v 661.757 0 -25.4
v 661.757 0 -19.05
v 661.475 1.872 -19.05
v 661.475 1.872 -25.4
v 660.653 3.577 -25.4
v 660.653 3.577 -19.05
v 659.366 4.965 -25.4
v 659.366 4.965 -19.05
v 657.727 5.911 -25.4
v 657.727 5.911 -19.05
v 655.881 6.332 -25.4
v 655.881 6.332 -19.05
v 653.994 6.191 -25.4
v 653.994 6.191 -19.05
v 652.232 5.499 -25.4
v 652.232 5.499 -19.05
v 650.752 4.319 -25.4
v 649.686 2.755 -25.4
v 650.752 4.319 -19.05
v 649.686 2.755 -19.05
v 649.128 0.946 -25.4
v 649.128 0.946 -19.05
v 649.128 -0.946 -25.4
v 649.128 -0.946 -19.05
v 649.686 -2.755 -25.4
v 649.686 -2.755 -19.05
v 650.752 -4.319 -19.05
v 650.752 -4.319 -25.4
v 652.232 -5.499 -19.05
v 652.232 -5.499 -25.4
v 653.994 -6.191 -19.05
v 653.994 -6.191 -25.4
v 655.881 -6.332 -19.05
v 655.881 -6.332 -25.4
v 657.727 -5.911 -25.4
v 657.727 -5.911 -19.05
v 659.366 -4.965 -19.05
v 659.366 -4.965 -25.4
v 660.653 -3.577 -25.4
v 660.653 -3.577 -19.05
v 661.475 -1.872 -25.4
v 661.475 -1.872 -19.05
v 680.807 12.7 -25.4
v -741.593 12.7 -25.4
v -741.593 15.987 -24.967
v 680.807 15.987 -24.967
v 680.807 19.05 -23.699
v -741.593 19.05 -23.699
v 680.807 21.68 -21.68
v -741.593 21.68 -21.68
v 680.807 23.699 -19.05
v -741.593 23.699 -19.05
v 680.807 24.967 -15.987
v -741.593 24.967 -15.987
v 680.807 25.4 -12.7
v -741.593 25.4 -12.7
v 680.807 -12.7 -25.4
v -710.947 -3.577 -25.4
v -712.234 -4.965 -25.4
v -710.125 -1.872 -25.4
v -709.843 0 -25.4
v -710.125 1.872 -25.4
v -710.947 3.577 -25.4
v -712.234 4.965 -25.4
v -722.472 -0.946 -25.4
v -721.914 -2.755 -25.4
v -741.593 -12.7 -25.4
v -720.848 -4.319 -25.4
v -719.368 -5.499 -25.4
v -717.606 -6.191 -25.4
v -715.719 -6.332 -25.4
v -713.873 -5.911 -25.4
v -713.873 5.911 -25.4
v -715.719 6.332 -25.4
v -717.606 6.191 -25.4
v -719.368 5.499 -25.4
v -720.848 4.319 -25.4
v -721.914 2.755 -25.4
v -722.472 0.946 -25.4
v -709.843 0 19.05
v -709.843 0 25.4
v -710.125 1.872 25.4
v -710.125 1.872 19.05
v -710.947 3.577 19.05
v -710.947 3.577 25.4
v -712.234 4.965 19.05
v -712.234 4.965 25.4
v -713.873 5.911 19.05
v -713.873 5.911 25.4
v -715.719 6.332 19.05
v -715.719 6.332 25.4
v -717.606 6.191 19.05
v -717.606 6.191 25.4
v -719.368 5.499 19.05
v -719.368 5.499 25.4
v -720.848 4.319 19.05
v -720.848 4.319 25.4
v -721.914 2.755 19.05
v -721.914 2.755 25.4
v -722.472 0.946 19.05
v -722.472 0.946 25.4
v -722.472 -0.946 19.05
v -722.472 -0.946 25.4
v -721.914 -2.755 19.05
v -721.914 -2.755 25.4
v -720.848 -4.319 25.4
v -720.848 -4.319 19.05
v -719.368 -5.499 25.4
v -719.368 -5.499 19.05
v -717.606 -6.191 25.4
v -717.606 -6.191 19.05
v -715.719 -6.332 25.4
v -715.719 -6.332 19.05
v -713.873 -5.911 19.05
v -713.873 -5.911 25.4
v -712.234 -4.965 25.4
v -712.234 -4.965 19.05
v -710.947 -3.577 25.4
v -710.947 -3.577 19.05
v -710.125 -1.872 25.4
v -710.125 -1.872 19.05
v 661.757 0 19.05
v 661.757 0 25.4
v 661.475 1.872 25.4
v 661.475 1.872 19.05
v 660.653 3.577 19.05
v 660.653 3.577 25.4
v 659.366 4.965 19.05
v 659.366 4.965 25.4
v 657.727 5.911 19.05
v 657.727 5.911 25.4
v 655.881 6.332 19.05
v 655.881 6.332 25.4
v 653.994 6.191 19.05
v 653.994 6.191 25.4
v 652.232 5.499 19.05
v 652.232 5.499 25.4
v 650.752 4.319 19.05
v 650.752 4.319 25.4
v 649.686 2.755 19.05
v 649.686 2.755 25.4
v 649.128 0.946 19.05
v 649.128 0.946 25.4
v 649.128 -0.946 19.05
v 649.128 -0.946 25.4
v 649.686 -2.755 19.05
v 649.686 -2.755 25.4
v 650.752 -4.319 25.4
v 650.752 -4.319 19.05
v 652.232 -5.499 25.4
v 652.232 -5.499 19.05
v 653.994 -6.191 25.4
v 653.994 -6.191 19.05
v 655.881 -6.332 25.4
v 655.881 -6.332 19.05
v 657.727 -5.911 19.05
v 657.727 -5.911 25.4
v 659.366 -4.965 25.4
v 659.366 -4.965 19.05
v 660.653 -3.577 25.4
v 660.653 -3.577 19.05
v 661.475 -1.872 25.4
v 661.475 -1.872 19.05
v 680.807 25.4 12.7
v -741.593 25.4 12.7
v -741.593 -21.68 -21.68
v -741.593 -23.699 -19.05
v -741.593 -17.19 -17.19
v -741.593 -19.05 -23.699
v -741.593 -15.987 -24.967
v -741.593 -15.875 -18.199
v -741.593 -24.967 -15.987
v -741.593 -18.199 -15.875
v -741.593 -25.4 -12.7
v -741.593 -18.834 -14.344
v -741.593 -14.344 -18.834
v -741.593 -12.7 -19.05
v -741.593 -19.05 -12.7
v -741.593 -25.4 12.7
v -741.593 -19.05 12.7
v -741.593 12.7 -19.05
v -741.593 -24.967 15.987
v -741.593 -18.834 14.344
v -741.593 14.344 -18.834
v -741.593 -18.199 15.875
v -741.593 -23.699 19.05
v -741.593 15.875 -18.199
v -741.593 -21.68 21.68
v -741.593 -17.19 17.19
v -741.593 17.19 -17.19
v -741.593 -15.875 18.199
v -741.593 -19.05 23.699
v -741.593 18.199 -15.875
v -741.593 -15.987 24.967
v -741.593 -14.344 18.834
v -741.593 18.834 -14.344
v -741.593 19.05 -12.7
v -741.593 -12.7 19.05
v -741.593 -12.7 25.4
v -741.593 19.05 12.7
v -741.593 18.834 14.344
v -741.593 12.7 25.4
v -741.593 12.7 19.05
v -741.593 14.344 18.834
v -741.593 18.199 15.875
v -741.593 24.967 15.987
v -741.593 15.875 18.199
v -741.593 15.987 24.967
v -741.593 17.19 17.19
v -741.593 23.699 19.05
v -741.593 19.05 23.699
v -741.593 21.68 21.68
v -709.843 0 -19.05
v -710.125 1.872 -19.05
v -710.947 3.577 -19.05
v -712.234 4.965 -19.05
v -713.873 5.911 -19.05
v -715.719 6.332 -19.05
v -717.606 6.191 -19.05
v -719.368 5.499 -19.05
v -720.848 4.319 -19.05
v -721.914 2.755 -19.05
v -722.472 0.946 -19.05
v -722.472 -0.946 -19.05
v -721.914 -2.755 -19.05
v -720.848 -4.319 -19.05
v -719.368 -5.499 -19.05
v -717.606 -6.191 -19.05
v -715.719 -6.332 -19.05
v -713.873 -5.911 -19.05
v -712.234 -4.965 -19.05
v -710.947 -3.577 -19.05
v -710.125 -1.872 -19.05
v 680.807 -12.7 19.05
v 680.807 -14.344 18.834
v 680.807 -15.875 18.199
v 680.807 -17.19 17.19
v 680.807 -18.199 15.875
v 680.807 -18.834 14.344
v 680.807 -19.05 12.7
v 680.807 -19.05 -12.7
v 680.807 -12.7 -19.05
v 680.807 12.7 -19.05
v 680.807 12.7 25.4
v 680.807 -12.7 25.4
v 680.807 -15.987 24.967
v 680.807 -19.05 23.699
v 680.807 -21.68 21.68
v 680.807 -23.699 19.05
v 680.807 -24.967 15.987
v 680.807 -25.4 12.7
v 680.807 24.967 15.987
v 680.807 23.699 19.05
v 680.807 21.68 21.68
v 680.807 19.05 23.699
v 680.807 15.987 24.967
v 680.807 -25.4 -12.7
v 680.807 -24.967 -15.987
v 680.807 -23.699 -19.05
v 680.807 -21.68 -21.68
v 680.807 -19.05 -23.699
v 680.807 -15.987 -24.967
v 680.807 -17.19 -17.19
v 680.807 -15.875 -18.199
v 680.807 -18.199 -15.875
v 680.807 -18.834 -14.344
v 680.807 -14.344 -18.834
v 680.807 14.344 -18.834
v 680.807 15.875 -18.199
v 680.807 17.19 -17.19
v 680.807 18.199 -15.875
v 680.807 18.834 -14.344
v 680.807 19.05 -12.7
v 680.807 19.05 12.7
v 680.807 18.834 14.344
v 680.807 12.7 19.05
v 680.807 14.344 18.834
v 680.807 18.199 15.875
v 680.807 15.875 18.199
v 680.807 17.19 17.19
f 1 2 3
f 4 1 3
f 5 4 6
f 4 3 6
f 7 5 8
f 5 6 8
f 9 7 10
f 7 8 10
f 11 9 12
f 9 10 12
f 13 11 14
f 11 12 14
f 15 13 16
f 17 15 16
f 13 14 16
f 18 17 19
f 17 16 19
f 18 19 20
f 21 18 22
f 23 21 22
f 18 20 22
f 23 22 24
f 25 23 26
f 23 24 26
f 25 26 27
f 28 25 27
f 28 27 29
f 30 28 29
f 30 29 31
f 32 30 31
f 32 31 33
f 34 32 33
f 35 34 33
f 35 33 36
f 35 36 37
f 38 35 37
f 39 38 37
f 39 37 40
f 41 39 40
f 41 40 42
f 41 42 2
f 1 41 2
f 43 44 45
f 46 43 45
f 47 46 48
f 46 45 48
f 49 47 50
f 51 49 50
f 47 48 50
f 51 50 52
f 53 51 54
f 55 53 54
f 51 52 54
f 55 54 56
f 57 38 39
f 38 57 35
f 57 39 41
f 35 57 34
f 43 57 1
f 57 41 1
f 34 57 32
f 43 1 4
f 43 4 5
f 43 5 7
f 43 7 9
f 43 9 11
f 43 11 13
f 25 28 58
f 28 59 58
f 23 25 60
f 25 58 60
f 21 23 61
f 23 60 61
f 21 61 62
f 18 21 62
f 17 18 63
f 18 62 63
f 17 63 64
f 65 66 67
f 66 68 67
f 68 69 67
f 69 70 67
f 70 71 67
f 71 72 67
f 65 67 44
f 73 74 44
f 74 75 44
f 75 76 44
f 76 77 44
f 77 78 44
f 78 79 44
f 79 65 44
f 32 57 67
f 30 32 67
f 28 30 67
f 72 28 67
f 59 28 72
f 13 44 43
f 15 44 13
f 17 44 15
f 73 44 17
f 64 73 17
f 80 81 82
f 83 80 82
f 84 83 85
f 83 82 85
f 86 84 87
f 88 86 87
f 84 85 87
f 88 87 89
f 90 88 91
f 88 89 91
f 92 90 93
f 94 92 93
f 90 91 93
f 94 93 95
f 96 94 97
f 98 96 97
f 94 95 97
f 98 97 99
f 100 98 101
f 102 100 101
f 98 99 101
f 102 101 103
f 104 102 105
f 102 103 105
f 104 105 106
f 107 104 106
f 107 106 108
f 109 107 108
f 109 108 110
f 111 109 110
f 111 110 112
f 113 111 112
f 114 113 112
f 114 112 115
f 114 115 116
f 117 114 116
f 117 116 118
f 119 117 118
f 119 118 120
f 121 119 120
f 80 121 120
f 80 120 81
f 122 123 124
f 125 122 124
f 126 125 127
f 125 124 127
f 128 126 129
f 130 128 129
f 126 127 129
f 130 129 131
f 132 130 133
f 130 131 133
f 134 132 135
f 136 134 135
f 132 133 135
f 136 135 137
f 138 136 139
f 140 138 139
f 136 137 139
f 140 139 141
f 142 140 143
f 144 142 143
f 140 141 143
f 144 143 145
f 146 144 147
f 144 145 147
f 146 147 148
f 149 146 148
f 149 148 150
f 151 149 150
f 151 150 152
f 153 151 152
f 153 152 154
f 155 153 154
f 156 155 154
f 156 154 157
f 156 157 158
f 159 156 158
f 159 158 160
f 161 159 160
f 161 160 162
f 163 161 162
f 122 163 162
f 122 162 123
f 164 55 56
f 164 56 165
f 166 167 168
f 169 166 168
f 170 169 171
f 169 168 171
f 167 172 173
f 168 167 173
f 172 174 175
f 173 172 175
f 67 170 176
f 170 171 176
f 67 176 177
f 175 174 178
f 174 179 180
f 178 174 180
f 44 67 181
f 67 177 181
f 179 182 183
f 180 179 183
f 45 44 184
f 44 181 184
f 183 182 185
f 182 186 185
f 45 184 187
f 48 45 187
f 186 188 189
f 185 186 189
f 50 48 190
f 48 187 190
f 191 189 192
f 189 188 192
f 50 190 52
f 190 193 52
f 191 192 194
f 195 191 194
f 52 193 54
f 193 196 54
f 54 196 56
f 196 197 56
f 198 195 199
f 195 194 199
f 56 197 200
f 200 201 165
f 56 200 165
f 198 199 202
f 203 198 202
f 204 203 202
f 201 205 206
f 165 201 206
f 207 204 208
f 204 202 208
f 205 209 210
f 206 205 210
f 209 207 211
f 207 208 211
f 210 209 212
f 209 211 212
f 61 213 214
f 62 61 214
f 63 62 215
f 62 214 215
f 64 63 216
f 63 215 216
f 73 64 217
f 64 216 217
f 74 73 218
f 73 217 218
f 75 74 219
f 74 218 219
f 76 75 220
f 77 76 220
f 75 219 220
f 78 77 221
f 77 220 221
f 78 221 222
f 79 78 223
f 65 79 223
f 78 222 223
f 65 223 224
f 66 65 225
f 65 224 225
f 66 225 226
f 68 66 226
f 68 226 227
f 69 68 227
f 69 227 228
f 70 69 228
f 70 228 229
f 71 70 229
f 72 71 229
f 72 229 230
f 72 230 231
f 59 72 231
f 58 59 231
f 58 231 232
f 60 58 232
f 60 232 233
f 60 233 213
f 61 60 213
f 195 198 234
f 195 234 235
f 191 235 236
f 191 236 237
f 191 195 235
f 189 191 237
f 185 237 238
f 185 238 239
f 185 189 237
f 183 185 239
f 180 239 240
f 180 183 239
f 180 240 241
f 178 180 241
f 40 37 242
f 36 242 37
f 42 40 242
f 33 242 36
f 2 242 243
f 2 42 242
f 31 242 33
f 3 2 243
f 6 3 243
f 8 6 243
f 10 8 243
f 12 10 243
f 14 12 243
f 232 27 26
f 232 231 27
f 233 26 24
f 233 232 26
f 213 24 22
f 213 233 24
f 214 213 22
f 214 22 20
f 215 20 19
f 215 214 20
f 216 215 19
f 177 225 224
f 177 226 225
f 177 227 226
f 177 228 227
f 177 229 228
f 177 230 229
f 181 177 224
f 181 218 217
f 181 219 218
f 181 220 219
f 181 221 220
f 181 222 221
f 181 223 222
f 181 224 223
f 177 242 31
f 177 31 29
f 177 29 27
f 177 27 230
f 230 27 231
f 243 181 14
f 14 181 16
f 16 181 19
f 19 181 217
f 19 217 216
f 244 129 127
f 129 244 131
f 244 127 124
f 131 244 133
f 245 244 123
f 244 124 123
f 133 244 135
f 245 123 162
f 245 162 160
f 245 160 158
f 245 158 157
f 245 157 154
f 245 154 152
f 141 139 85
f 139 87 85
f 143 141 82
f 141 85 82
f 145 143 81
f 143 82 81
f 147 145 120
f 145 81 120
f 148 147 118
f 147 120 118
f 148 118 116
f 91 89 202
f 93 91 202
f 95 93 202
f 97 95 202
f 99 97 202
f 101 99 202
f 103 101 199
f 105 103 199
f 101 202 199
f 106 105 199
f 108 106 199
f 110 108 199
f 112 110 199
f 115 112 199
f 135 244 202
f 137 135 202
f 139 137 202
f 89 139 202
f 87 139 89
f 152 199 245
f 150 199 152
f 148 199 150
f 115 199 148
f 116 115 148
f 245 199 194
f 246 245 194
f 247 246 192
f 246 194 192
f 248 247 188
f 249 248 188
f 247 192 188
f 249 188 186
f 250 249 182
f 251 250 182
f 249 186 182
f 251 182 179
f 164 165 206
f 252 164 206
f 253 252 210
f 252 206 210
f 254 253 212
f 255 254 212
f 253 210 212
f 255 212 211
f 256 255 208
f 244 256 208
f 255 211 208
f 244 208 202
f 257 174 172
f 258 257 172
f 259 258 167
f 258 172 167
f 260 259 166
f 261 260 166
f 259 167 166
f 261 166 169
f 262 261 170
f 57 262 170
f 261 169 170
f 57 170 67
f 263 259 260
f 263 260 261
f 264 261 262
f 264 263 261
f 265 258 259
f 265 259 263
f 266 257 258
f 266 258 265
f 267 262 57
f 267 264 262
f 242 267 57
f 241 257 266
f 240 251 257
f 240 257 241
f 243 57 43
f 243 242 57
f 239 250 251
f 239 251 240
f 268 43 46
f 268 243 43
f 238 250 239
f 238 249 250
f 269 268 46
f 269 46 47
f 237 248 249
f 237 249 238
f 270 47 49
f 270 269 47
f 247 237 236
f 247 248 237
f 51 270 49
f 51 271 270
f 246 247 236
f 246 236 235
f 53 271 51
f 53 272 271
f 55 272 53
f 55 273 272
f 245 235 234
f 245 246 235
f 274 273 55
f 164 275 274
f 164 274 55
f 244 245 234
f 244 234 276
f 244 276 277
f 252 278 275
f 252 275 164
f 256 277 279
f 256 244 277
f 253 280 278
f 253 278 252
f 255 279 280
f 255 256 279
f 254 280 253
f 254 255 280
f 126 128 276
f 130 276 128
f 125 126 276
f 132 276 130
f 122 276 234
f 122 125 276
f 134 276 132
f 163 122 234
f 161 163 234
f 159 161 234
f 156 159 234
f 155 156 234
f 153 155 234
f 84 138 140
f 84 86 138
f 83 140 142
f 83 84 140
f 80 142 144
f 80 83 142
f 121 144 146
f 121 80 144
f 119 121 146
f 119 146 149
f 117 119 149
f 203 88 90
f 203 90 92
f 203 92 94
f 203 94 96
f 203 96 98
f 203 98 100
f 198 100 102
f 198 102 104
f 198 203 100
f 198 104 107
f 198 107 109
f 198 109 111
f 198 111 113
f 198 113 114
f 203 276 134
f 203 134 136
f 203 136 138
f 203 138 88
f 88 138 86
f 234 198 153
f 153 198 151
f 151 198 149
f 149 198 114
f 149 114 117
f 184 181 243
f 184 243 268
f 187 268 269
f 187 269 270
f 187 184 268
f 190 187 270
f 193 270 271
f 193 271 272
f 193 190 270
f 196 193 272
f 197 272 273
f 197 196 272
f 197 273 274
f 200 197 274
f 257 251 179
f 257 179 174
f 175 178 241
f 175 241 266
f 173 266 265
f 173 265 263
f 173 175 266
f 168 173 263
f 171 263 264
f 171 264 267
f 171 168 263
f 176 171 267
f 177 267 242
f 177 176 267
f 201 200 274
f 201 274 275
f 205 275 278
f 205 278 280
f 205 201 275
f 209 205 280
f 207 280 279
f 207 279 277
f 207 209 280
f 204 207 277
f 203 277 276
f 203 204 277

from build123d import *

# Parameters (mm, degrees)
STRUCTURAL_MEMBER1_DEPTH = 1422.4
SKETCH12_R               = 6.35
CUT_EXTRUDE1_DEPTH       = 744.764894646


with BuildPart() as part:
    # Sketch11 → Structural Member1 (new body)
    with BuildSketch(Plane.YZ.offset(-741.593162393)):
        with BuildLine():
            Line((-12.7, -25.4), (12.7, -25.4))
            ThreePointArc((12.7, -25.4), (21.680256121, -21.680256121), (25.4, -12.7))
            Line((25.4, -12.7), (25.4, 12.7))
            ThreePointArc((25.4, 12.7), (21.680256121, 21.680256121), (12.7, 25.4))
            Line((12.7, 25.4), (-12.7, 25.4))
            ThreePointArc((-12.7, 25.4), (-21.680256121, 21.680256121), (-25.4, 12.7))
            Line((-25.4, 12.7), (-25.4, -12.7))
            ThreePointArc((-25.4, -12.7), (-21.680256121, -21.680256121), (-12.7, -25.4))
        make_face()
        with BuildLine():
            Line((-12.7, -19.05), (12.7, -19.05))
            ThreePointArc((12.7, -19.05), (17.190128061, -17.190128061), (19.05, -12.7))
            Line((19.05, -12.7), (19.05, 12.7))
            ThreePointArc((19.05, 12.7), (17.190128061, 17.190128061), (12.7, 19.05))
            Line((12.7, 19.05), (-12.7, 19.05))
            ThreePointArc((-12.7, 19.05), (-17.190128061, 17.190128061), (-19.05, 12.7))
            Line((-19.05, 12.7), (-19.05, -12.7))
            ThreePointArc((-19.05, -12.7), (-17.190128061, -17.190128061), (-12.7, -19.05))
        make_face(mode=Mode.SUBTRACT)
    extrude(amount=STRUCTURAL_MEMBER1_DEPTH)

    # Sketch12 → Cut-Extrude1 (cut, through all)
    with BuildSketch(Plane.XY.offset(25.4)):
        with Locations((-716.193162393, 0)):
            Circle(SKETCH12_R)
        with Locations((655.406837607, 0)):
            Circle(SKETCH12_R)
    extrude(amount=-CUT_EXTRUDE1_DEPTH, mode=Mode.SUBTRACT)


solid = part.part
